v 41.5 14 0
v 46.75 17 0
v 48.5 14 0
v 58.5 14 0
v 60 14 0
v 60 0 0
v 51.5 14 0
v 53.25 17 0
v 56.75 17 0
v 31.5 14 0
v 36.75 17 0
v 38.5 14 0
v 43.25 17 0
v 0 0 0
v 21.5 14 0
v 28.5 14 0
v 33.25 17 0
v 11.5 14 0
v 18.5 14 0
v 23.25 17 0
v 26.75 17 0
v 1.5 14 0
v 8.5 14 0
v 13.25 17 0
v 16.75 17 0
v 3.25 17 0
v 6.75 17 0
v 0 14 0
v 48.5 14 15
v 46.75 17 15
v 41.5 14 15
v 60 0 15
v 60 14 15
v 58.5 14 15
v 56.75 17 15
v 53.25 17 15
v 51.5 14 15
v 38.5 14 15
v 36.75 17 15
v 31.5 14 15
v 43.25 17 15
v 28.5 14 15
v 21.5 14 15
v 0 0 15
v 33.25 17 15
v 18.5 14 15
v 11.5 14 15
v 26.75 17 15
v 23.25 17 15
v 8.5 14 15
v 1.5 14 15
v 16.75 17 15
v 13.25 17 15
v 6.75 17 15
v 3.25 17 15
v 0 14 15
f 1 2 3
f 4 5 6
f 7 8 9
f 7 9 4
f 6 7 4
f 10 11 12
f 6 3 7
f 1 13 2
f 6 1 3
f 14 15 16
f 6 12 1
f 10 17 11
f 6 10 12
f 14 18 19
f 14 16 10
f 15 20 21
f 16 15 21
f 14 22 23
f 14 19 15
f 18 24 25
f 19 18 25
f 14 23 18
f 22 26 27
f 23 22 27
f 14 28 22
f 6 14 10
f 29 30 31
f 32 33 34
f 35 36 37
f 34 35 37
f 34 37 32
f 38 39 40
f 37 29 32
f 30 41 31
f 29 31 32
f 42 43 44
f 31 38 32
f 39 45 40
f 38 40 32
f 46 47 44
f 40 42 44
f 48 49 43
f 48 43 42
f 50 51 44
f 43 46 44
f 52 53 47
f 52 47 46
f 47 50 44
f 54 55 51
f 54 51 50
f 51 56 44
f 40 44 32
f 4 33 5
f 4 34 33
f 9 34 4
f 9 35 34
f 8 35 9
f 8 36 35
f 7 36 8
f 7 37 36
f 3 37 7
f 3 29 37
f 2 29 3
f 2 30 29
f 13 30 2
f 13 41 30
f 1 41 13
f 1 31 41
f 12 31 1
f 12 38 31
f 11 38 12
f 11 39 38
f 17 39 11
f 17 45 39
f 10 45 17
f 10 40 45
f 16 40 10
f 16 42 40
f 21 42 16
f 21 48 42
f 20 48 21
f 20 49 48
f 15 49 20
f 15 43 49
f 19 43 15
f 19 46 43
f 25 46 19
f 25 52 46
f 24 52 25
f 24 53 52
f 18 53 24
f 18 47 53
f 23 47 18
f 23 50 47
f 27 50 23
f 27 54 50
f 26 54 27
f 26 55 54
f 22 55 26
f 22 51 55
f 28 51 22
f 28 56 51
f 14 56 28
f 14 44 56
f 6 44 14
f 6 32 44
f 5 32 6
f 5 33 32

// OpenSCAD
$fn = 32;

// ----------------------------------------------------------------------
// Gear rack: 6 teeth, pitch 10 mm
// ----------------------------------------------------------------------

// --- parameters (mm) ---
teeth = 6;                // number of teeth
pitch = 10;               // tooth pitch, X
root_w = 7;               // tooth width at the root
tip_w = 3.5;              // tooth width at the tip
base_h = 14;              // rack body height, Y
tooth_h = 3;              // tooth height above the body
plate_t = 15;             // rack width, Z (extrusion height)

rack_l = teeth * pitch;  // overall length
total_h = base_h + tooth_h;  // overall height

profile = [[0, 0], [60, 0], [60, 14], [58.5, 14], [56.75, 17], [53.25, 17], [51.5, 14], [48.5, 14], [46.75, 17], [43.25, 17], [41.5, 14], [38.5, 14], [36.75, 17], [33.25, 17], [31.5, 14], [28.5, 14], [26.75, 17], [23.25, 17], [21.5, 14], [18.5, 14], [16.75, 17], [13.25, 17], [11.5, 14], [8.5, 14], [6.75, 17], [3.25, 17], [1.5, 14], [0, 14]];  // primary outline, 28 points, counter clockwise

// --- the one profile operation ---
linear_extrude(height = plate_t) polygon(points = profile);
